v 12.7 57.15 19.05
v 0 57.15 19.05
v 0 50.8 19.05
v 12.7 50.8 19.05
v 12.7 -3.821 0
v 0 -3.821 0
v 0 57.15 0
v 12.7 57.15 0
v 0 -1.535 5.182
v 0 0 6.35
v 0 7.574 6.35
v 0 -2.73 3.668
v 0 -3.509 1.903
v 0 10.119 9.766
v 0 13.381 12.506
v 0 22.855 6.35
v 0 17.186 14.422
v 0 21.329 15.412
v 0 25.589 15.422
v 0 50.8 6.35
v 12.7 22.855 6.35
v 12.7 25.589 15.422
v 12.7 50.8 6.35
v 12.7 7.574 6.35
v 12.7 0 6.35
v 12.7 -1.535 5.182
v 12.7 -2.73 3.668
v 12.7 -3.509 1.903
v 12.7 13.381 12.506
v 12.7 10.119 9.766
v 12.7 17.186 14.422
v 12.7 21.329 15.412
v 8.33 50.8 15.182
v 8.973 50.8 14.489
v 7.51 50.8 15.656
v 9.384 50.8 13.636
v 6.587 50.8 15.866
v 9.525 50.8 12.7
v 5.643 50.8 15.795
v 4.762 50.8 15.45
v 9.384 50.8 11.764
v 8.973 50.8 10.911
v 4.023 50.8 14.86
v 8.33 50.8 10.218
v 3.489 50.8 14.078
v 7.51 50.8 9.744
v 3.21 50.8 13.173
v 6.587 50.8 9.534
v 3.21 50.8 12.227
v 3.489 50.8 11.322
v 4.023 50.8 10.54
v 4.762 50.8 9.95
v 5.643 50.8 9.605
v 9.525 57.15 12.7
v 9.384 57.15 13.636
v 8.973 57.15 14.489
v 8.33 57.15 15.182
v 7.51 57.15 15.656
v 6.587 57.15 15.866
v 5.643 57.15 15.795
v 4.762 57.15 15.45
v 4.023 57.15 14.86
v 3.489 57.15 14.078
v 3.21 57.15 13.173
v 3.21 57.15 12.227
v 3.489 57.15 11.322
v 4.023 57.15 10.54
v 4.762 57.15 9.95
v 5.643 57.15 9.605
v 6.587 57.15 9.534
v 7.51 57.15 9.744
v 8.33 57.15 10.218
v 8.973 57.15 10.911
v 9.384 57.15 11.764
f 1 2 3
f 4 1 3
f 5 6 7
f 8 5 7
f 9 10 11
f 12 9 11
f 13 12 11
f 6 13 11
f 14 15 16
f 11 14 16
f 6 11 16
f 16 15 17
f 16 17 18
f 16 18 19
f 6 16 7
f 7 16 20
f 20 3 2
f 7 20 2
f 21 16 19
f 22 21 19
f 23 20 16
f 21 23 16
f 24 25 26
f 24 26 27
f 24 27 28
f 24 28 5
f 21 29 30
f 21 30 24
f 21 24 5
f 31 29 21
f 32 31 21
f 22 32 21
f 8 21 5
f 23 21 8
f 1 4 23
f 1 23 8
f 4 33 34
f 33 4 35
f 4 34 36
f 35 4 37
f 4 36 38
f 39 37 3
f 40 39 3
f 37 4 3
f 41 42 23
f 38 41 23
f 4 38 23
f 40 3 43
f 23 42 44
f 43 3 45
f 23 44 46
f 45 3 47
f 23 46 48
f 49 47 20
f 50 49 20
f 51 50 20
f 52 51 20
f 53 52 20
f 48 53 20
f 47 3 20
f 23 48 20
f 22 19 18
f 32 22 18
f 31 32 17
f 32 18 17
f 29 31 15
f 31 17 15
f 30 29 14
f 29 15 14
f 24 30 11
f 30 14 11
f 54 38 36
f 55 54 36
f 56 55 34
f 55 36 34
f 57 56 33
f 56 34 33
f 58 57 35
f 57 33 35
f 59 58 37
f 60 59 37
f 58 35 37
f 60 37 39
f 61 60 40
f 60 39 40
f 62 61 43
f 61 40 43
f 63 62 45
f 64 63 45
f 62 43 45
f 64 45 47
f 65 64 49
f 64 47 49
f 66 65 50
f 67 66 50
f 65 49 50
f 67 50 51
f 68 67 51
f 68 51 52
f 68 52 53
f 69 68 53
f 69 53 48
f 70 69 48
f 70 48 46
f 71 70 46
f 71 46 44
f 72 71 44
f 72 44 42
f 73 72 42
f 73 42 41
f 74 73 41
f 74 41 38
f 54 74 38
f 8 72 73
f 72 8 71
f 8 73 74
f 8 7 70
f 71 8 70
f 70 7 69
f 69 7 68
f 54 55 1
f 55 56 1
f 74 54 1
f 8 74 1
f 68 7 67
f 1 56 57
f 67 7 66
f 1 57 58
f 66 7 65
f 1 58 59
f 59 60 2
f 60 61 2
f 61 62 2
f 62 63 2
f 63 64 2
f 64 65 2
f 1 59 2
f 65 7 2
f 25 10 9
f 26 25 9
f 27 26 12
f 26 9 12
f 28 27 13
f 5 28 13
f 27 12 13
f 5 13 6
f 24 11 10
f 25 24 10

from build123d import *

# Parameters (mm, degrees)
F1_DEPTH = 12.7
F2_R     = 3.175
F3_DEPTH = 25.4


with BuildPart() as f1:
    # F0 (on Right) → F1 (new body)
    with BuildSketch(Plane.YZ):
        with BuildLine():
            Line((-3.82134, 0), (0, 0))
            Line((0, 0), (50.8, 0))
            Line((50.8, 0), (57.15, 0))
            Line((57.15, 0), (57.15, 19.05))
            Line((57.15, 19.05), (50.8, 19.05))
            Line((50.8, 19.05), (50.8, 6.35))
            Line((50.8, 6.35), (22.854816, 6.35))
            Line((22.854816, 6.35), (25.589257, 15.422352))
            ThreePointArc((25.589257, 15.422352), (15.227977, 13.574267), (7.574122, 6.35))
            Line((7.574122, 6.35), (0, 6.35))
            ThreePointArc((0, 6.35), (-2.73009, 3.668115), (-3.82134, 0))
        make_face()
    extrude(amount=F1_DEPTH)

    # F2 (on face) → F3 (cut)
    with BuildSketch(Plane.XZ.offset(-50.8)):
        with Locations((6.35, 12.7)):
            Circle(F2_R)
    extrude(amount=-F3_DEPTH, mode=Mode.SUBTRACT)


solid = f1.part
